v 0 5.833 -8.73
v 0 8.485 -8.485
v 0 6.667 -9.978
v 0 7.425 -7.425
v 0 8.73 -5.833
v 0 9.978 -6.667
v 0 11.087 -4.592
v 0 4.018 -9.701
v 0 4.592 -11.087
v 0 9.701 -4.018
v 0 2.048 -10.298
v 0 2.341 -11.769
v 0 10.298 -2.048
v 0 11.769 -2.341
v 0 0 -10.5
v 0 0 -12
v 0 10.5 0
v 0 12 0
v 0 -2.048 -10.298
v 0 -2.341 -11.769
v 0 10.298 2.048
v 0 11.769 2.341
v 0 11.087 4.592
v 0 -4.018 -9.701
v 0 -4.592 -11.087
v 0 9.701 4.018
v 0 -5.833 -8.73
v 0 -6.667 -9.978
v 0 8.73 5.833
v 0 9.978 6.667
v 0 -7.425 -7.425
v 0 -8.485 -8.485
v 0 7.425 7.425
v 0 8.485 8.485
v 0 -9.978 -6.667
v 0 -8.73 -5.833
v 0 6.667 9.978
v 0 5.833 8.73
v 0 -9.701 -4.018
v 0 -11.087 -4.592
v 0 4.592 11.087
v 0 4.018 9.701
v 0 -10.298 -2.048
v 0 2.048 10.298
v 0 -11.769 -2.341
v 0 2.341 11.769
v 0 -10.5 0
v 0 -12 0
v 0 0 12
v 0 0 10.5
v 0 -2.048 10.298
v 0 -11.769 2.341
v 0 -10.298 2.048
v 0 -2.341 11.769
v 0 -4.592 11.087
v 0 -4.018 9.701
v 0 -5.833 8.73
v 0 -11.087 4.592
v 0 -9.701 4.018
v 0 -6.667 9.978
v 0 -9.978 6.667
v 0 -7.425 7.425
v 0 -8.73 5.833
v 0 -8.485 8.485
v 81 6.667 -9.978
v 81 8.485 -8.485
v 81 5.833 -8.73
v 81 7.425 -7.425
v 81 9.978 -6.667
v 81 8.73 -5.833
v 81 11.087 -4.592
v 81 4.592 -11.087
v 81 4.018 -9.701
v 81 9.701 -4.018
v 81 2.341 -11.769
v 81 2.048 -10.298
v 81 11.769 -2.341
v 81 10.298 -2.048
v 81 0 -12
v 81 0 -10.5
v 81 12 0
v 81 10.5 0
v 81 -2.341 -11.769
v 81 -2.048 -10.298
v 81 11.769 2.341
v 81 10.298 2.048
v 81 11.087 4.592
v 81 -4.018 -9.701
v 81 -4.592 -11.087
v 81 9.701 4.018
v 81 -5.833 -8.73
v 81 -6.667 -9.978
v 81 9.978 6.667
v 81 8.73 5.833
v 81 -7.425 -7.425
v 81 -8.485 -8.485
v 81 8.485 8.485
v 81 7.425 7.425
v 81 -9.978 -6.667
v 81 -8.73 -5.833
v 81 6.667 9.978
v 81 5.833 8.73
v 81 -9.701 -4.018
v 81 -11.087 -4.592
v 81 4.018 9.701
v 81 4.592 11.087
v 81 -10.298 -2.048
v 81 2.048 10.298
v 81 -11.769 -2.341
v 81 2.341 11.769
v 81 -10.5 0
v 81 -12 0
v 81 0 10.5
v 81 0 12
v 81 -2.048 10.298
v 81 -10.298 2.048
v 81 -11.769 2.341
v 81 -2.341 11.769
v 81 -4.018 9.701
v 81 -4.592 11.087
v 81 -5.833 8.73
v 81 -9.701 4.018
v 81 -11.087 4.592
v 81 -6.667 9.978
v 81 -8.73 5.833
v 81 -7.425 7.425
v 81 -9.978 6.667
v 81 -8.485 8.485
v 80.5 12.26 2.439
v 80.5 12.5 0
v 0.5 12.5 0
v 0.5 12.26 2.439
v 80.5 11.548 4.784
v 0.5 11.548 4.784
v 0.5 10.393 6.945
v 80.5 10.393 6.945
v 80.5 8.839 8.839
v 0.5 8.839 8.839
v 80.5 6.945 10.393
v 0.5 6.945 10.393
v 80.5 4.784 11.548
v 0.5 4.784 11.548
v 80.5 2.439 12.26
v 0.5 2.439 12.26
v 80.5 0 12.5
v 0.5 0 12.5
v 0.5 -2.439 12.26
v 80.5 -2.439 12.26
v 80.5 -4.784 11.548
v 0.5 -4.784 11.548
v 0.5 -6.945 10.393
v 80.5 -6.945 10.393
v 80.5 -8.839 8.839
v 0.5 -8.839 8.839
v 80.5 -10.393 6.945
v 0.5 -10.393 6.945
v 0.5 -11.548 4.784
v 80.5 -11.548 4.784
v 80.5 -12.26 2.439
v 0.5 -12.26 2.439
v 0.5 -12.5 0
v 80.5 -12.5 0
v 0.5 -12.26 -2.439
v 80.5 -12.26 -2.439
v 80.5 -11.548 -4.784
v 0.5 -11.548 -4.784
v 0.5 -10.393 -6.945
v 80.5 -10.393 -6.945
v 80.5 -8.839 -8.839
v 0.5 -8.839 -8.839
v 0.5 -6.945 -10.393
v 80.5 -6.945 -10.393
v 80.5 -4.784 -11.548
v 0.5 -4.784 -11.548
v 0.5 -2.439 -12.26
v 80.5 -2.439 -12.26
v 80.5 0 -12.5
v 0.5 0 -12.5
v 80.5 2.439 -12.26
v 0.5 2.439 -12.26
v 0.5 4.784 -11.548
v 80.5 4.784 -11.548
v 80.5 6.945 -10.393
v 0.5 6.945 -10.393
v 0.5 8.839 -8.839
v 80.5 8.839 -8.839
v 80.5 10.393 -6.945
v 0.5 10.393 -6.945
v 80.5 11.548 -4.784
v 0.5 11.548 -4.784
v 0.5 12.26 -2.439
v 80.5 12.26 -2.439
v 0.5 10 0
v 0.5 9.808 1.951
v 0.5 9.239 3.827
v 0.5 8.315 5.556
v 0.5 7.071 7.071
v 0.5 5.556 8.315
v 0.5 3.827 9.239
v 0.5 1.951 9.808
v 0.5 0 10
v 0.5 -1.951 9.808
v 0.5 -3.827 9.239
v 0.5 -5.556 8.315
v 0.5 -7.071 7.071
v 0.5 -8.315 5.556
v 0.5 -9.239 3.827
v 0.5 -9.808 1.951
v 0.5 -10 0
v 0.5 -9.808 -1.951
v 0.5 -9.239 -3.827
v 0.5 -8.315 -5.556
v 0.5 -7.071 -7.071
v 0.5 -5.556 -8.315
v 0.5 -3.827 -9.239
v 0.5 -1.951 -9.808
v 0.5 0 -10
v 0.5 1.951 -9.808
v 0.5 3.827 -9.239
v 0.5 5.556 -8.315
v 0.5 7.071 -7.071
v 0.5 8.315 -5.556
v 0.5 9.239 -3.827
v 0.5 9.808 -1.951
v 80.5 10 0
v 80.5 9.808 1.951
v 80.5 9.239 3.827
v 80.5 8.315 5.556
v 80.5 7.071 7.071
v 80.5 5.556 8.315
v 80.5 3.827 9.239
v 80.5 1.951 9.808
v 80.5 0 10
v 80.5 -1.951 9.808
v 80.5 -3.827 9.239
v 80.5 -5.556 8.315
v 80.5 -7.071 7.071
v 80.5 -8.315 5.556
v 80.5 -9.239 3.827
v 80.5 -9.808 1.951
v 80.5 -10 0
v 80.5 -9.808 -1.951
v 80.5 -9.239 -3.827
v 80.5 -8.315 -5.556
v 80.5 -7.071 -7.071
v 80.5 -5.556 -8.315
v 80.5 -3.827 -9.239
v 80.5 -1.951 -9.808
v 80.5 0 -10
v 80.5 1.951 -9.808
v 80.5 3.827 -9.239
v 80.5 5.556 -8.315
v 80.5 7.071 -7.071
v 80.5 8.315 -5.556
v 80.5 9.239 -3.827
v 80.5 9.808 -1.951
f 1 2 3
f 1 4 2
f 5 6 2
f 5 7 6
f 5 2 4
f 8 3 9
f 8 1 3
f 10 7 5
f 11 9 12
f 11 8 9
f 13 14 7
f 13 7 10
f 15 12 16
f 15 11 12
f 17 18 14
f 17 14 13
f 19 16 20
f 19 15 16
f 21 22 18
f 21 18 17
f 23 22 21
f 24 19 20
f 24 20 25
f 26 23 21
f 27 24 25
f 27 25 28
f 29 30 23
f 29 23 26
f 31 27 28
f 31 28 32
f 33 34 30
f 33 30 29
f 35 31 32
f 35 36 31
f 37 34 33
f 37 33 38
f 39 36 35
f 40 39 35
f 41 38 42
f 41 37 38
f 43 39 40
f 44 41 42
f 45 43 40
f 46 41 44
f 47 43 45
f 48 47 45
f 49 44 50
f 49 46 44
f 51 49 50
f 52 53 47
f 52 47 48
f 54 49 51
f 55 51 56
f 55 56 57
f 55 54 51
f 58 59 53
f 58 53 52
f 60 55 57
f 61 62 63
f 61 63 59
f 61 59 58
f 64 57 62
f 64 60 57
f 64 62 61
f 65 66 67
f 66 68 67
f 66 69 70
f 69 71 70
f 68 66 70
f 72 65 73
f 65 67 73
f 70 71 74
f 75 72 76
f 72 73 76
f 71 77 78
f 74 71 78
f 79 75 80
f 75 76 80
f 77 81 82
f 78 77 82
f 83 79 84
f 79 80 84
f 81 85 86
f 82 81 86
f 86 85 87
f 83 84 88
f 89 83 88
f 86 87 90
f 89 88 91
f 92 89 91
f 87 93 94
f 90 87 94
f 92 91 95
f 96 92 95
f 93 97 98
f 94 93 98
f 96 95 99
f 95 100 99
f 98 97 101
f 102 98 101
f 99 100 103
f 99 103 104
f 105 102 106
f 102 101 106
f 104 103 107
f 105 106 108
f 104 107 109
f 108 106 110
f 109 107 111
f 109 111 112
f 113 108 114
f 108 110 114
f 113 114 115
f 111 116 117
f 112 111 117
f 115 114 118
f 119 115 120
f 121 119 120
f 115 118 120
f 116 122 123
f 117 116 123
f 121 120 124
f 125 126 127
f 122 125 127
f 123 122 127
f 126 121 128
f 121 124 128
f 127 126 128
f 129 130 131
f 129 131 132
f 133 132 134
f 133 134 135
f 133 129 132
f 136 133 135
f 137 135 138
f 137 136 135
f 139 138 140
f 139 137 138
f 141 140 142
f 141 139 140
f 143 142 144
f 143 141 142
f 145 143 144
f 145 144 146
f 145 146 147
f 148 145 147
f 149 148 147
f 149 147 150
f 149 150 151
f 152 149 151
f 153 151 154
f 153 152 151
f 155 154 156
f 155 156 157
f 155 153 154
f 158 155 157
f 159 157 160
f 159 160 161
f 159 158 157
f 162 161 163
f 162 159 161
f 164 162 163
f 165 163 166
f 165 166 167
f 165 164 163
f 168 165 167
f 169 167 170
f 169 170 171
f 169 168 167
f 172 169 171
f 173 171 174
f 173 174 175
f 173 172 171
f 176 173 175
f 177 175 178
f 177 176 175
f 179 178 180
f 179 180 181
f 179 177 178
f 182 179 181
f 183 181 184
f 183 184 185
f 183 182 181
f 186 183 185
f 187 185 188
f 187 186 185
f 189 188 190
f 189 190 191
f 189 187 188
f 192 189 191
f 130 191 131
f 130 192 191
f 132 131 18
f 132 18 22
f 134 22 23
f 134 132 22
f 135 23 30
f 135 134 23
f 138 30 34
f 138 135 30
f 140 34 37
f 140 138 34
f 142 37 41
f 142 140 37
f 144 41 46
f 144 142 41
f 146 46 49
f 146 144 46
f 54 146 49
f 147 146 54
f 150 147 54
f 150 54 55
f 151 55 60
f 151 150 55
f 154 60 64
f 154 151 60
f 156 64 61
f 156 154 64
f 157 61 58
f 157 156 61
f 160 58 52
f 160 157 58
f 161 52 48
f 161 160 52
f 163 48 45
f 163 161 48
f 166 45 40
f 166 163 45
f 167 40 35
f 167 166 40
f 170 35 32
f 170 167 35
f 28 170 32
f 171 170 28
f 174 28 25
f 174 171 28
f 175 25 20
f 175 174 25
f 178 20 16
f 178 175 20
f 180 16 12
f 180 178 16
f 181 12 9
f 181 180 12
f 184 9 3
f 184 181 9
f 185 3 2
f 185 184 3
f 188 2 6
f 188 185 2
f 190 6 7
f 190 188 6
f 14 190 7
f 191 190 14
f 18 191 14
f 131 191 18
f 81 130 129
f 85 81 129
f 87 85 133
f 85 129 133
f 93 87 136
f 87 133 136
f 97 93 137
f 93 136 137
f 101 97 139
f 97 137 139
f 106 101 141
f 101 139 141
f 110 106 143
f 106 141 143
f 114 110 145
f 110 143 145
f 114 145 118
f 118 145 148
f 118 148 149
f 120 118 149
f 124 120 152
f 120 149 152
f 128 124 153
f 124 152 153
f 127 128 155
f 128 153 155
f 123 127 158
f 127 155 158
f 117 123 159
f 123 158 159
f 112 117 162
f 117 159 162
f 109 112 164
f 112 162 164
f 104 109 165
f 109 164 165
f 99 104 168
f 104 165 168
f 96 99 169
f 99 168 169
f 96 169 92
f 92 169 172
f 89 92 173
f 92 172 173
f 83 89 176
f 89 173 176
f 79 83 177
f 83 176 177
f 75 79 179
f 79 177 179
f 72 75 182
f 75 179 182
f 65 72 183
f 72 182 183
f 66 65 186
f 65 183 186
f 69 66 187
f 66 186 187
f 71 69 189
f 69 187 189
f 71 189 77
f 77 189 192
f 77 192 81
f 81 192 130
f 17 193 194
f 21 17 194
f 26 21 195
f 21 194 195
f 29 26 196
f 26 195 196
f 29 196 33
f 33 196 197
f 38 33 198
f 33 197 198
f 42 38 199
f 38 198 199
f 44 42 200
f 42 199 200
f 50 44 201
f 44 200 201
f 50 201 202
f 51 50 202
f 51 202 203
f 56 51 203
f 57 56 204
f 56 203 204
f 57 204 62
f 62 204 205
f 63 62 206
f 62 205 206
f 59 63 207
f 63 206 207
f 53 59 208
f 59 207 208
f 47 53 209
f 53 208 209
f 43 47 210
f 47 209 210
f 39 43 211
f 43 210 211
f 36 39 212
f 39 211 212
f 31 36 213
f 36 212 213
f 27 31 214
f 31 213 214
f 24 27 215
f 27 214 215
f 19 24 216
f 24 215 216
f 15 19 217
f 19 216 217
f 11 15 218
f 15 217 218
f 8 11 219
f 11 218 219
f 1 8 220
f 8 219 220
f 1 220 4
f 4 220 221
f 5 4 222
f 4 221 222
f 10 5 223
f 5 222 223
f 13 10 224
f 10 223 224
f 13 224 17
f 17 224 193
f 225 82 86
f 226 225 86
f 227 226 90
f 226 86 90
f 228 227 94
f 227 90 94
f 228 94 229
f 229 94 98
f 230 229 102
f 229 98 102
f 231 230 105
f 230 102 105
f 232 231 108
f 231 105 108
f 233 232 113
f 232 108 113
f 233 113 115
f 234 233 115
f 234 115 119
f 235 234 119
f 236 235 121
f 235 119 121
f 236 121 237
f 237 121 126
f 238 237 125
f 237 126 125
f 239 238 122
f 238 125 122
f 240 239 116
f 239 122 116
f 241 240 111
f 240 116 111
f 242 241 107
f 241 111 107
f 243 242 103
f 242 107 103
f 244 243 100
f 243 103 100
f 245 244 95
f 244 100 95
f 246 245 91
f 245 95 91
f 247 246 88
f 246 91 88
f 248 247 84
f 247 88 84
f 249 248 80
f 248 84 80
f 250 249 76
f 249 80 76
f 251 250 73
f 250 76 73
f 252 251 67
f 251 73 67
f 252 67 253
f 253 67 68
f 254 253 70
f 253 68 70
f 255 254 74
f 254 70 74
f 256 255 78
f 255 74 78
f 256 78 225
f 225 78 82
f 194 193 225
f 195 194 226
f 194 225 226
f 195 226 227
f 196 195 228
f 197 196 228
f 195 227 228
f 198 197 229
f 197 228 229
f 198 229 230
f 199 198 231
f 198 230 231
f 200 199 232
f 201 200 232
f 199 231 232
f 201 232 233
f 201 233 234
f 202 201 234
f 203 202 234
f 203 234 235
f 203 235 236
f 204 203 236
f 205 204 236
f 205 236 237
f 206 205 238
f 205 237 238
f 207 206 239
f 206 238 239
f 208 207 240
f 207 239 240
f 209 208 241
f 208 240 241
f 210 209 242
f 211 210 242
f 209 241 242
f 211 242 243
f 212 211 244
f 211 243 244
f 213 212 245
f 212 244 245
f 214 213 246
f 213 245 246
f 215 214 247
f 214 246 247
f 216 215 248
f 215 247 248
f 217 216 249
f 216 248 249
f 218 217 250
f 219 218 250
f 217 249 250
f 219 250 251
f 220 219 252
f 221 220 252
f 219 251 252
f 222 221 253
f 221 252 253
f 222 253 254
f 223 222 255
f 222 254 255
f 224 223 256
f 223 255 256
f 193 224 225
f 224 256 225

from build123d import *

# Parameters (mm, degrees)
SKETCH_1_W     = 81
SKETCH_1_H     = 2.5
CHAMFER_1_SIZE = 0.5


with BuildPart() as part:
    # Эскиз1 → Повернуть1 (revolve)
    with BuildSketch(Plane.XY):
        with Locations((40.5, 11.25)):
            Rectangle(SKETCH_1_W, SKETCH_1_H)
    revolve(axis=Axis((0, 0, 0), (1, 0, 0)))

    # Фаска1
    chamfer_1_edges = [part.edges().sort_by_distance(p)[0] for p in [
        (81, -12.5, 0),
        (81, -10, 0),
        (0, -10, 0),
        (0, -12.5, 0),
    ]]
    chamfer(chamfer_1_edges, length=CHAMFER_1_SIZE)


solid = part.part
